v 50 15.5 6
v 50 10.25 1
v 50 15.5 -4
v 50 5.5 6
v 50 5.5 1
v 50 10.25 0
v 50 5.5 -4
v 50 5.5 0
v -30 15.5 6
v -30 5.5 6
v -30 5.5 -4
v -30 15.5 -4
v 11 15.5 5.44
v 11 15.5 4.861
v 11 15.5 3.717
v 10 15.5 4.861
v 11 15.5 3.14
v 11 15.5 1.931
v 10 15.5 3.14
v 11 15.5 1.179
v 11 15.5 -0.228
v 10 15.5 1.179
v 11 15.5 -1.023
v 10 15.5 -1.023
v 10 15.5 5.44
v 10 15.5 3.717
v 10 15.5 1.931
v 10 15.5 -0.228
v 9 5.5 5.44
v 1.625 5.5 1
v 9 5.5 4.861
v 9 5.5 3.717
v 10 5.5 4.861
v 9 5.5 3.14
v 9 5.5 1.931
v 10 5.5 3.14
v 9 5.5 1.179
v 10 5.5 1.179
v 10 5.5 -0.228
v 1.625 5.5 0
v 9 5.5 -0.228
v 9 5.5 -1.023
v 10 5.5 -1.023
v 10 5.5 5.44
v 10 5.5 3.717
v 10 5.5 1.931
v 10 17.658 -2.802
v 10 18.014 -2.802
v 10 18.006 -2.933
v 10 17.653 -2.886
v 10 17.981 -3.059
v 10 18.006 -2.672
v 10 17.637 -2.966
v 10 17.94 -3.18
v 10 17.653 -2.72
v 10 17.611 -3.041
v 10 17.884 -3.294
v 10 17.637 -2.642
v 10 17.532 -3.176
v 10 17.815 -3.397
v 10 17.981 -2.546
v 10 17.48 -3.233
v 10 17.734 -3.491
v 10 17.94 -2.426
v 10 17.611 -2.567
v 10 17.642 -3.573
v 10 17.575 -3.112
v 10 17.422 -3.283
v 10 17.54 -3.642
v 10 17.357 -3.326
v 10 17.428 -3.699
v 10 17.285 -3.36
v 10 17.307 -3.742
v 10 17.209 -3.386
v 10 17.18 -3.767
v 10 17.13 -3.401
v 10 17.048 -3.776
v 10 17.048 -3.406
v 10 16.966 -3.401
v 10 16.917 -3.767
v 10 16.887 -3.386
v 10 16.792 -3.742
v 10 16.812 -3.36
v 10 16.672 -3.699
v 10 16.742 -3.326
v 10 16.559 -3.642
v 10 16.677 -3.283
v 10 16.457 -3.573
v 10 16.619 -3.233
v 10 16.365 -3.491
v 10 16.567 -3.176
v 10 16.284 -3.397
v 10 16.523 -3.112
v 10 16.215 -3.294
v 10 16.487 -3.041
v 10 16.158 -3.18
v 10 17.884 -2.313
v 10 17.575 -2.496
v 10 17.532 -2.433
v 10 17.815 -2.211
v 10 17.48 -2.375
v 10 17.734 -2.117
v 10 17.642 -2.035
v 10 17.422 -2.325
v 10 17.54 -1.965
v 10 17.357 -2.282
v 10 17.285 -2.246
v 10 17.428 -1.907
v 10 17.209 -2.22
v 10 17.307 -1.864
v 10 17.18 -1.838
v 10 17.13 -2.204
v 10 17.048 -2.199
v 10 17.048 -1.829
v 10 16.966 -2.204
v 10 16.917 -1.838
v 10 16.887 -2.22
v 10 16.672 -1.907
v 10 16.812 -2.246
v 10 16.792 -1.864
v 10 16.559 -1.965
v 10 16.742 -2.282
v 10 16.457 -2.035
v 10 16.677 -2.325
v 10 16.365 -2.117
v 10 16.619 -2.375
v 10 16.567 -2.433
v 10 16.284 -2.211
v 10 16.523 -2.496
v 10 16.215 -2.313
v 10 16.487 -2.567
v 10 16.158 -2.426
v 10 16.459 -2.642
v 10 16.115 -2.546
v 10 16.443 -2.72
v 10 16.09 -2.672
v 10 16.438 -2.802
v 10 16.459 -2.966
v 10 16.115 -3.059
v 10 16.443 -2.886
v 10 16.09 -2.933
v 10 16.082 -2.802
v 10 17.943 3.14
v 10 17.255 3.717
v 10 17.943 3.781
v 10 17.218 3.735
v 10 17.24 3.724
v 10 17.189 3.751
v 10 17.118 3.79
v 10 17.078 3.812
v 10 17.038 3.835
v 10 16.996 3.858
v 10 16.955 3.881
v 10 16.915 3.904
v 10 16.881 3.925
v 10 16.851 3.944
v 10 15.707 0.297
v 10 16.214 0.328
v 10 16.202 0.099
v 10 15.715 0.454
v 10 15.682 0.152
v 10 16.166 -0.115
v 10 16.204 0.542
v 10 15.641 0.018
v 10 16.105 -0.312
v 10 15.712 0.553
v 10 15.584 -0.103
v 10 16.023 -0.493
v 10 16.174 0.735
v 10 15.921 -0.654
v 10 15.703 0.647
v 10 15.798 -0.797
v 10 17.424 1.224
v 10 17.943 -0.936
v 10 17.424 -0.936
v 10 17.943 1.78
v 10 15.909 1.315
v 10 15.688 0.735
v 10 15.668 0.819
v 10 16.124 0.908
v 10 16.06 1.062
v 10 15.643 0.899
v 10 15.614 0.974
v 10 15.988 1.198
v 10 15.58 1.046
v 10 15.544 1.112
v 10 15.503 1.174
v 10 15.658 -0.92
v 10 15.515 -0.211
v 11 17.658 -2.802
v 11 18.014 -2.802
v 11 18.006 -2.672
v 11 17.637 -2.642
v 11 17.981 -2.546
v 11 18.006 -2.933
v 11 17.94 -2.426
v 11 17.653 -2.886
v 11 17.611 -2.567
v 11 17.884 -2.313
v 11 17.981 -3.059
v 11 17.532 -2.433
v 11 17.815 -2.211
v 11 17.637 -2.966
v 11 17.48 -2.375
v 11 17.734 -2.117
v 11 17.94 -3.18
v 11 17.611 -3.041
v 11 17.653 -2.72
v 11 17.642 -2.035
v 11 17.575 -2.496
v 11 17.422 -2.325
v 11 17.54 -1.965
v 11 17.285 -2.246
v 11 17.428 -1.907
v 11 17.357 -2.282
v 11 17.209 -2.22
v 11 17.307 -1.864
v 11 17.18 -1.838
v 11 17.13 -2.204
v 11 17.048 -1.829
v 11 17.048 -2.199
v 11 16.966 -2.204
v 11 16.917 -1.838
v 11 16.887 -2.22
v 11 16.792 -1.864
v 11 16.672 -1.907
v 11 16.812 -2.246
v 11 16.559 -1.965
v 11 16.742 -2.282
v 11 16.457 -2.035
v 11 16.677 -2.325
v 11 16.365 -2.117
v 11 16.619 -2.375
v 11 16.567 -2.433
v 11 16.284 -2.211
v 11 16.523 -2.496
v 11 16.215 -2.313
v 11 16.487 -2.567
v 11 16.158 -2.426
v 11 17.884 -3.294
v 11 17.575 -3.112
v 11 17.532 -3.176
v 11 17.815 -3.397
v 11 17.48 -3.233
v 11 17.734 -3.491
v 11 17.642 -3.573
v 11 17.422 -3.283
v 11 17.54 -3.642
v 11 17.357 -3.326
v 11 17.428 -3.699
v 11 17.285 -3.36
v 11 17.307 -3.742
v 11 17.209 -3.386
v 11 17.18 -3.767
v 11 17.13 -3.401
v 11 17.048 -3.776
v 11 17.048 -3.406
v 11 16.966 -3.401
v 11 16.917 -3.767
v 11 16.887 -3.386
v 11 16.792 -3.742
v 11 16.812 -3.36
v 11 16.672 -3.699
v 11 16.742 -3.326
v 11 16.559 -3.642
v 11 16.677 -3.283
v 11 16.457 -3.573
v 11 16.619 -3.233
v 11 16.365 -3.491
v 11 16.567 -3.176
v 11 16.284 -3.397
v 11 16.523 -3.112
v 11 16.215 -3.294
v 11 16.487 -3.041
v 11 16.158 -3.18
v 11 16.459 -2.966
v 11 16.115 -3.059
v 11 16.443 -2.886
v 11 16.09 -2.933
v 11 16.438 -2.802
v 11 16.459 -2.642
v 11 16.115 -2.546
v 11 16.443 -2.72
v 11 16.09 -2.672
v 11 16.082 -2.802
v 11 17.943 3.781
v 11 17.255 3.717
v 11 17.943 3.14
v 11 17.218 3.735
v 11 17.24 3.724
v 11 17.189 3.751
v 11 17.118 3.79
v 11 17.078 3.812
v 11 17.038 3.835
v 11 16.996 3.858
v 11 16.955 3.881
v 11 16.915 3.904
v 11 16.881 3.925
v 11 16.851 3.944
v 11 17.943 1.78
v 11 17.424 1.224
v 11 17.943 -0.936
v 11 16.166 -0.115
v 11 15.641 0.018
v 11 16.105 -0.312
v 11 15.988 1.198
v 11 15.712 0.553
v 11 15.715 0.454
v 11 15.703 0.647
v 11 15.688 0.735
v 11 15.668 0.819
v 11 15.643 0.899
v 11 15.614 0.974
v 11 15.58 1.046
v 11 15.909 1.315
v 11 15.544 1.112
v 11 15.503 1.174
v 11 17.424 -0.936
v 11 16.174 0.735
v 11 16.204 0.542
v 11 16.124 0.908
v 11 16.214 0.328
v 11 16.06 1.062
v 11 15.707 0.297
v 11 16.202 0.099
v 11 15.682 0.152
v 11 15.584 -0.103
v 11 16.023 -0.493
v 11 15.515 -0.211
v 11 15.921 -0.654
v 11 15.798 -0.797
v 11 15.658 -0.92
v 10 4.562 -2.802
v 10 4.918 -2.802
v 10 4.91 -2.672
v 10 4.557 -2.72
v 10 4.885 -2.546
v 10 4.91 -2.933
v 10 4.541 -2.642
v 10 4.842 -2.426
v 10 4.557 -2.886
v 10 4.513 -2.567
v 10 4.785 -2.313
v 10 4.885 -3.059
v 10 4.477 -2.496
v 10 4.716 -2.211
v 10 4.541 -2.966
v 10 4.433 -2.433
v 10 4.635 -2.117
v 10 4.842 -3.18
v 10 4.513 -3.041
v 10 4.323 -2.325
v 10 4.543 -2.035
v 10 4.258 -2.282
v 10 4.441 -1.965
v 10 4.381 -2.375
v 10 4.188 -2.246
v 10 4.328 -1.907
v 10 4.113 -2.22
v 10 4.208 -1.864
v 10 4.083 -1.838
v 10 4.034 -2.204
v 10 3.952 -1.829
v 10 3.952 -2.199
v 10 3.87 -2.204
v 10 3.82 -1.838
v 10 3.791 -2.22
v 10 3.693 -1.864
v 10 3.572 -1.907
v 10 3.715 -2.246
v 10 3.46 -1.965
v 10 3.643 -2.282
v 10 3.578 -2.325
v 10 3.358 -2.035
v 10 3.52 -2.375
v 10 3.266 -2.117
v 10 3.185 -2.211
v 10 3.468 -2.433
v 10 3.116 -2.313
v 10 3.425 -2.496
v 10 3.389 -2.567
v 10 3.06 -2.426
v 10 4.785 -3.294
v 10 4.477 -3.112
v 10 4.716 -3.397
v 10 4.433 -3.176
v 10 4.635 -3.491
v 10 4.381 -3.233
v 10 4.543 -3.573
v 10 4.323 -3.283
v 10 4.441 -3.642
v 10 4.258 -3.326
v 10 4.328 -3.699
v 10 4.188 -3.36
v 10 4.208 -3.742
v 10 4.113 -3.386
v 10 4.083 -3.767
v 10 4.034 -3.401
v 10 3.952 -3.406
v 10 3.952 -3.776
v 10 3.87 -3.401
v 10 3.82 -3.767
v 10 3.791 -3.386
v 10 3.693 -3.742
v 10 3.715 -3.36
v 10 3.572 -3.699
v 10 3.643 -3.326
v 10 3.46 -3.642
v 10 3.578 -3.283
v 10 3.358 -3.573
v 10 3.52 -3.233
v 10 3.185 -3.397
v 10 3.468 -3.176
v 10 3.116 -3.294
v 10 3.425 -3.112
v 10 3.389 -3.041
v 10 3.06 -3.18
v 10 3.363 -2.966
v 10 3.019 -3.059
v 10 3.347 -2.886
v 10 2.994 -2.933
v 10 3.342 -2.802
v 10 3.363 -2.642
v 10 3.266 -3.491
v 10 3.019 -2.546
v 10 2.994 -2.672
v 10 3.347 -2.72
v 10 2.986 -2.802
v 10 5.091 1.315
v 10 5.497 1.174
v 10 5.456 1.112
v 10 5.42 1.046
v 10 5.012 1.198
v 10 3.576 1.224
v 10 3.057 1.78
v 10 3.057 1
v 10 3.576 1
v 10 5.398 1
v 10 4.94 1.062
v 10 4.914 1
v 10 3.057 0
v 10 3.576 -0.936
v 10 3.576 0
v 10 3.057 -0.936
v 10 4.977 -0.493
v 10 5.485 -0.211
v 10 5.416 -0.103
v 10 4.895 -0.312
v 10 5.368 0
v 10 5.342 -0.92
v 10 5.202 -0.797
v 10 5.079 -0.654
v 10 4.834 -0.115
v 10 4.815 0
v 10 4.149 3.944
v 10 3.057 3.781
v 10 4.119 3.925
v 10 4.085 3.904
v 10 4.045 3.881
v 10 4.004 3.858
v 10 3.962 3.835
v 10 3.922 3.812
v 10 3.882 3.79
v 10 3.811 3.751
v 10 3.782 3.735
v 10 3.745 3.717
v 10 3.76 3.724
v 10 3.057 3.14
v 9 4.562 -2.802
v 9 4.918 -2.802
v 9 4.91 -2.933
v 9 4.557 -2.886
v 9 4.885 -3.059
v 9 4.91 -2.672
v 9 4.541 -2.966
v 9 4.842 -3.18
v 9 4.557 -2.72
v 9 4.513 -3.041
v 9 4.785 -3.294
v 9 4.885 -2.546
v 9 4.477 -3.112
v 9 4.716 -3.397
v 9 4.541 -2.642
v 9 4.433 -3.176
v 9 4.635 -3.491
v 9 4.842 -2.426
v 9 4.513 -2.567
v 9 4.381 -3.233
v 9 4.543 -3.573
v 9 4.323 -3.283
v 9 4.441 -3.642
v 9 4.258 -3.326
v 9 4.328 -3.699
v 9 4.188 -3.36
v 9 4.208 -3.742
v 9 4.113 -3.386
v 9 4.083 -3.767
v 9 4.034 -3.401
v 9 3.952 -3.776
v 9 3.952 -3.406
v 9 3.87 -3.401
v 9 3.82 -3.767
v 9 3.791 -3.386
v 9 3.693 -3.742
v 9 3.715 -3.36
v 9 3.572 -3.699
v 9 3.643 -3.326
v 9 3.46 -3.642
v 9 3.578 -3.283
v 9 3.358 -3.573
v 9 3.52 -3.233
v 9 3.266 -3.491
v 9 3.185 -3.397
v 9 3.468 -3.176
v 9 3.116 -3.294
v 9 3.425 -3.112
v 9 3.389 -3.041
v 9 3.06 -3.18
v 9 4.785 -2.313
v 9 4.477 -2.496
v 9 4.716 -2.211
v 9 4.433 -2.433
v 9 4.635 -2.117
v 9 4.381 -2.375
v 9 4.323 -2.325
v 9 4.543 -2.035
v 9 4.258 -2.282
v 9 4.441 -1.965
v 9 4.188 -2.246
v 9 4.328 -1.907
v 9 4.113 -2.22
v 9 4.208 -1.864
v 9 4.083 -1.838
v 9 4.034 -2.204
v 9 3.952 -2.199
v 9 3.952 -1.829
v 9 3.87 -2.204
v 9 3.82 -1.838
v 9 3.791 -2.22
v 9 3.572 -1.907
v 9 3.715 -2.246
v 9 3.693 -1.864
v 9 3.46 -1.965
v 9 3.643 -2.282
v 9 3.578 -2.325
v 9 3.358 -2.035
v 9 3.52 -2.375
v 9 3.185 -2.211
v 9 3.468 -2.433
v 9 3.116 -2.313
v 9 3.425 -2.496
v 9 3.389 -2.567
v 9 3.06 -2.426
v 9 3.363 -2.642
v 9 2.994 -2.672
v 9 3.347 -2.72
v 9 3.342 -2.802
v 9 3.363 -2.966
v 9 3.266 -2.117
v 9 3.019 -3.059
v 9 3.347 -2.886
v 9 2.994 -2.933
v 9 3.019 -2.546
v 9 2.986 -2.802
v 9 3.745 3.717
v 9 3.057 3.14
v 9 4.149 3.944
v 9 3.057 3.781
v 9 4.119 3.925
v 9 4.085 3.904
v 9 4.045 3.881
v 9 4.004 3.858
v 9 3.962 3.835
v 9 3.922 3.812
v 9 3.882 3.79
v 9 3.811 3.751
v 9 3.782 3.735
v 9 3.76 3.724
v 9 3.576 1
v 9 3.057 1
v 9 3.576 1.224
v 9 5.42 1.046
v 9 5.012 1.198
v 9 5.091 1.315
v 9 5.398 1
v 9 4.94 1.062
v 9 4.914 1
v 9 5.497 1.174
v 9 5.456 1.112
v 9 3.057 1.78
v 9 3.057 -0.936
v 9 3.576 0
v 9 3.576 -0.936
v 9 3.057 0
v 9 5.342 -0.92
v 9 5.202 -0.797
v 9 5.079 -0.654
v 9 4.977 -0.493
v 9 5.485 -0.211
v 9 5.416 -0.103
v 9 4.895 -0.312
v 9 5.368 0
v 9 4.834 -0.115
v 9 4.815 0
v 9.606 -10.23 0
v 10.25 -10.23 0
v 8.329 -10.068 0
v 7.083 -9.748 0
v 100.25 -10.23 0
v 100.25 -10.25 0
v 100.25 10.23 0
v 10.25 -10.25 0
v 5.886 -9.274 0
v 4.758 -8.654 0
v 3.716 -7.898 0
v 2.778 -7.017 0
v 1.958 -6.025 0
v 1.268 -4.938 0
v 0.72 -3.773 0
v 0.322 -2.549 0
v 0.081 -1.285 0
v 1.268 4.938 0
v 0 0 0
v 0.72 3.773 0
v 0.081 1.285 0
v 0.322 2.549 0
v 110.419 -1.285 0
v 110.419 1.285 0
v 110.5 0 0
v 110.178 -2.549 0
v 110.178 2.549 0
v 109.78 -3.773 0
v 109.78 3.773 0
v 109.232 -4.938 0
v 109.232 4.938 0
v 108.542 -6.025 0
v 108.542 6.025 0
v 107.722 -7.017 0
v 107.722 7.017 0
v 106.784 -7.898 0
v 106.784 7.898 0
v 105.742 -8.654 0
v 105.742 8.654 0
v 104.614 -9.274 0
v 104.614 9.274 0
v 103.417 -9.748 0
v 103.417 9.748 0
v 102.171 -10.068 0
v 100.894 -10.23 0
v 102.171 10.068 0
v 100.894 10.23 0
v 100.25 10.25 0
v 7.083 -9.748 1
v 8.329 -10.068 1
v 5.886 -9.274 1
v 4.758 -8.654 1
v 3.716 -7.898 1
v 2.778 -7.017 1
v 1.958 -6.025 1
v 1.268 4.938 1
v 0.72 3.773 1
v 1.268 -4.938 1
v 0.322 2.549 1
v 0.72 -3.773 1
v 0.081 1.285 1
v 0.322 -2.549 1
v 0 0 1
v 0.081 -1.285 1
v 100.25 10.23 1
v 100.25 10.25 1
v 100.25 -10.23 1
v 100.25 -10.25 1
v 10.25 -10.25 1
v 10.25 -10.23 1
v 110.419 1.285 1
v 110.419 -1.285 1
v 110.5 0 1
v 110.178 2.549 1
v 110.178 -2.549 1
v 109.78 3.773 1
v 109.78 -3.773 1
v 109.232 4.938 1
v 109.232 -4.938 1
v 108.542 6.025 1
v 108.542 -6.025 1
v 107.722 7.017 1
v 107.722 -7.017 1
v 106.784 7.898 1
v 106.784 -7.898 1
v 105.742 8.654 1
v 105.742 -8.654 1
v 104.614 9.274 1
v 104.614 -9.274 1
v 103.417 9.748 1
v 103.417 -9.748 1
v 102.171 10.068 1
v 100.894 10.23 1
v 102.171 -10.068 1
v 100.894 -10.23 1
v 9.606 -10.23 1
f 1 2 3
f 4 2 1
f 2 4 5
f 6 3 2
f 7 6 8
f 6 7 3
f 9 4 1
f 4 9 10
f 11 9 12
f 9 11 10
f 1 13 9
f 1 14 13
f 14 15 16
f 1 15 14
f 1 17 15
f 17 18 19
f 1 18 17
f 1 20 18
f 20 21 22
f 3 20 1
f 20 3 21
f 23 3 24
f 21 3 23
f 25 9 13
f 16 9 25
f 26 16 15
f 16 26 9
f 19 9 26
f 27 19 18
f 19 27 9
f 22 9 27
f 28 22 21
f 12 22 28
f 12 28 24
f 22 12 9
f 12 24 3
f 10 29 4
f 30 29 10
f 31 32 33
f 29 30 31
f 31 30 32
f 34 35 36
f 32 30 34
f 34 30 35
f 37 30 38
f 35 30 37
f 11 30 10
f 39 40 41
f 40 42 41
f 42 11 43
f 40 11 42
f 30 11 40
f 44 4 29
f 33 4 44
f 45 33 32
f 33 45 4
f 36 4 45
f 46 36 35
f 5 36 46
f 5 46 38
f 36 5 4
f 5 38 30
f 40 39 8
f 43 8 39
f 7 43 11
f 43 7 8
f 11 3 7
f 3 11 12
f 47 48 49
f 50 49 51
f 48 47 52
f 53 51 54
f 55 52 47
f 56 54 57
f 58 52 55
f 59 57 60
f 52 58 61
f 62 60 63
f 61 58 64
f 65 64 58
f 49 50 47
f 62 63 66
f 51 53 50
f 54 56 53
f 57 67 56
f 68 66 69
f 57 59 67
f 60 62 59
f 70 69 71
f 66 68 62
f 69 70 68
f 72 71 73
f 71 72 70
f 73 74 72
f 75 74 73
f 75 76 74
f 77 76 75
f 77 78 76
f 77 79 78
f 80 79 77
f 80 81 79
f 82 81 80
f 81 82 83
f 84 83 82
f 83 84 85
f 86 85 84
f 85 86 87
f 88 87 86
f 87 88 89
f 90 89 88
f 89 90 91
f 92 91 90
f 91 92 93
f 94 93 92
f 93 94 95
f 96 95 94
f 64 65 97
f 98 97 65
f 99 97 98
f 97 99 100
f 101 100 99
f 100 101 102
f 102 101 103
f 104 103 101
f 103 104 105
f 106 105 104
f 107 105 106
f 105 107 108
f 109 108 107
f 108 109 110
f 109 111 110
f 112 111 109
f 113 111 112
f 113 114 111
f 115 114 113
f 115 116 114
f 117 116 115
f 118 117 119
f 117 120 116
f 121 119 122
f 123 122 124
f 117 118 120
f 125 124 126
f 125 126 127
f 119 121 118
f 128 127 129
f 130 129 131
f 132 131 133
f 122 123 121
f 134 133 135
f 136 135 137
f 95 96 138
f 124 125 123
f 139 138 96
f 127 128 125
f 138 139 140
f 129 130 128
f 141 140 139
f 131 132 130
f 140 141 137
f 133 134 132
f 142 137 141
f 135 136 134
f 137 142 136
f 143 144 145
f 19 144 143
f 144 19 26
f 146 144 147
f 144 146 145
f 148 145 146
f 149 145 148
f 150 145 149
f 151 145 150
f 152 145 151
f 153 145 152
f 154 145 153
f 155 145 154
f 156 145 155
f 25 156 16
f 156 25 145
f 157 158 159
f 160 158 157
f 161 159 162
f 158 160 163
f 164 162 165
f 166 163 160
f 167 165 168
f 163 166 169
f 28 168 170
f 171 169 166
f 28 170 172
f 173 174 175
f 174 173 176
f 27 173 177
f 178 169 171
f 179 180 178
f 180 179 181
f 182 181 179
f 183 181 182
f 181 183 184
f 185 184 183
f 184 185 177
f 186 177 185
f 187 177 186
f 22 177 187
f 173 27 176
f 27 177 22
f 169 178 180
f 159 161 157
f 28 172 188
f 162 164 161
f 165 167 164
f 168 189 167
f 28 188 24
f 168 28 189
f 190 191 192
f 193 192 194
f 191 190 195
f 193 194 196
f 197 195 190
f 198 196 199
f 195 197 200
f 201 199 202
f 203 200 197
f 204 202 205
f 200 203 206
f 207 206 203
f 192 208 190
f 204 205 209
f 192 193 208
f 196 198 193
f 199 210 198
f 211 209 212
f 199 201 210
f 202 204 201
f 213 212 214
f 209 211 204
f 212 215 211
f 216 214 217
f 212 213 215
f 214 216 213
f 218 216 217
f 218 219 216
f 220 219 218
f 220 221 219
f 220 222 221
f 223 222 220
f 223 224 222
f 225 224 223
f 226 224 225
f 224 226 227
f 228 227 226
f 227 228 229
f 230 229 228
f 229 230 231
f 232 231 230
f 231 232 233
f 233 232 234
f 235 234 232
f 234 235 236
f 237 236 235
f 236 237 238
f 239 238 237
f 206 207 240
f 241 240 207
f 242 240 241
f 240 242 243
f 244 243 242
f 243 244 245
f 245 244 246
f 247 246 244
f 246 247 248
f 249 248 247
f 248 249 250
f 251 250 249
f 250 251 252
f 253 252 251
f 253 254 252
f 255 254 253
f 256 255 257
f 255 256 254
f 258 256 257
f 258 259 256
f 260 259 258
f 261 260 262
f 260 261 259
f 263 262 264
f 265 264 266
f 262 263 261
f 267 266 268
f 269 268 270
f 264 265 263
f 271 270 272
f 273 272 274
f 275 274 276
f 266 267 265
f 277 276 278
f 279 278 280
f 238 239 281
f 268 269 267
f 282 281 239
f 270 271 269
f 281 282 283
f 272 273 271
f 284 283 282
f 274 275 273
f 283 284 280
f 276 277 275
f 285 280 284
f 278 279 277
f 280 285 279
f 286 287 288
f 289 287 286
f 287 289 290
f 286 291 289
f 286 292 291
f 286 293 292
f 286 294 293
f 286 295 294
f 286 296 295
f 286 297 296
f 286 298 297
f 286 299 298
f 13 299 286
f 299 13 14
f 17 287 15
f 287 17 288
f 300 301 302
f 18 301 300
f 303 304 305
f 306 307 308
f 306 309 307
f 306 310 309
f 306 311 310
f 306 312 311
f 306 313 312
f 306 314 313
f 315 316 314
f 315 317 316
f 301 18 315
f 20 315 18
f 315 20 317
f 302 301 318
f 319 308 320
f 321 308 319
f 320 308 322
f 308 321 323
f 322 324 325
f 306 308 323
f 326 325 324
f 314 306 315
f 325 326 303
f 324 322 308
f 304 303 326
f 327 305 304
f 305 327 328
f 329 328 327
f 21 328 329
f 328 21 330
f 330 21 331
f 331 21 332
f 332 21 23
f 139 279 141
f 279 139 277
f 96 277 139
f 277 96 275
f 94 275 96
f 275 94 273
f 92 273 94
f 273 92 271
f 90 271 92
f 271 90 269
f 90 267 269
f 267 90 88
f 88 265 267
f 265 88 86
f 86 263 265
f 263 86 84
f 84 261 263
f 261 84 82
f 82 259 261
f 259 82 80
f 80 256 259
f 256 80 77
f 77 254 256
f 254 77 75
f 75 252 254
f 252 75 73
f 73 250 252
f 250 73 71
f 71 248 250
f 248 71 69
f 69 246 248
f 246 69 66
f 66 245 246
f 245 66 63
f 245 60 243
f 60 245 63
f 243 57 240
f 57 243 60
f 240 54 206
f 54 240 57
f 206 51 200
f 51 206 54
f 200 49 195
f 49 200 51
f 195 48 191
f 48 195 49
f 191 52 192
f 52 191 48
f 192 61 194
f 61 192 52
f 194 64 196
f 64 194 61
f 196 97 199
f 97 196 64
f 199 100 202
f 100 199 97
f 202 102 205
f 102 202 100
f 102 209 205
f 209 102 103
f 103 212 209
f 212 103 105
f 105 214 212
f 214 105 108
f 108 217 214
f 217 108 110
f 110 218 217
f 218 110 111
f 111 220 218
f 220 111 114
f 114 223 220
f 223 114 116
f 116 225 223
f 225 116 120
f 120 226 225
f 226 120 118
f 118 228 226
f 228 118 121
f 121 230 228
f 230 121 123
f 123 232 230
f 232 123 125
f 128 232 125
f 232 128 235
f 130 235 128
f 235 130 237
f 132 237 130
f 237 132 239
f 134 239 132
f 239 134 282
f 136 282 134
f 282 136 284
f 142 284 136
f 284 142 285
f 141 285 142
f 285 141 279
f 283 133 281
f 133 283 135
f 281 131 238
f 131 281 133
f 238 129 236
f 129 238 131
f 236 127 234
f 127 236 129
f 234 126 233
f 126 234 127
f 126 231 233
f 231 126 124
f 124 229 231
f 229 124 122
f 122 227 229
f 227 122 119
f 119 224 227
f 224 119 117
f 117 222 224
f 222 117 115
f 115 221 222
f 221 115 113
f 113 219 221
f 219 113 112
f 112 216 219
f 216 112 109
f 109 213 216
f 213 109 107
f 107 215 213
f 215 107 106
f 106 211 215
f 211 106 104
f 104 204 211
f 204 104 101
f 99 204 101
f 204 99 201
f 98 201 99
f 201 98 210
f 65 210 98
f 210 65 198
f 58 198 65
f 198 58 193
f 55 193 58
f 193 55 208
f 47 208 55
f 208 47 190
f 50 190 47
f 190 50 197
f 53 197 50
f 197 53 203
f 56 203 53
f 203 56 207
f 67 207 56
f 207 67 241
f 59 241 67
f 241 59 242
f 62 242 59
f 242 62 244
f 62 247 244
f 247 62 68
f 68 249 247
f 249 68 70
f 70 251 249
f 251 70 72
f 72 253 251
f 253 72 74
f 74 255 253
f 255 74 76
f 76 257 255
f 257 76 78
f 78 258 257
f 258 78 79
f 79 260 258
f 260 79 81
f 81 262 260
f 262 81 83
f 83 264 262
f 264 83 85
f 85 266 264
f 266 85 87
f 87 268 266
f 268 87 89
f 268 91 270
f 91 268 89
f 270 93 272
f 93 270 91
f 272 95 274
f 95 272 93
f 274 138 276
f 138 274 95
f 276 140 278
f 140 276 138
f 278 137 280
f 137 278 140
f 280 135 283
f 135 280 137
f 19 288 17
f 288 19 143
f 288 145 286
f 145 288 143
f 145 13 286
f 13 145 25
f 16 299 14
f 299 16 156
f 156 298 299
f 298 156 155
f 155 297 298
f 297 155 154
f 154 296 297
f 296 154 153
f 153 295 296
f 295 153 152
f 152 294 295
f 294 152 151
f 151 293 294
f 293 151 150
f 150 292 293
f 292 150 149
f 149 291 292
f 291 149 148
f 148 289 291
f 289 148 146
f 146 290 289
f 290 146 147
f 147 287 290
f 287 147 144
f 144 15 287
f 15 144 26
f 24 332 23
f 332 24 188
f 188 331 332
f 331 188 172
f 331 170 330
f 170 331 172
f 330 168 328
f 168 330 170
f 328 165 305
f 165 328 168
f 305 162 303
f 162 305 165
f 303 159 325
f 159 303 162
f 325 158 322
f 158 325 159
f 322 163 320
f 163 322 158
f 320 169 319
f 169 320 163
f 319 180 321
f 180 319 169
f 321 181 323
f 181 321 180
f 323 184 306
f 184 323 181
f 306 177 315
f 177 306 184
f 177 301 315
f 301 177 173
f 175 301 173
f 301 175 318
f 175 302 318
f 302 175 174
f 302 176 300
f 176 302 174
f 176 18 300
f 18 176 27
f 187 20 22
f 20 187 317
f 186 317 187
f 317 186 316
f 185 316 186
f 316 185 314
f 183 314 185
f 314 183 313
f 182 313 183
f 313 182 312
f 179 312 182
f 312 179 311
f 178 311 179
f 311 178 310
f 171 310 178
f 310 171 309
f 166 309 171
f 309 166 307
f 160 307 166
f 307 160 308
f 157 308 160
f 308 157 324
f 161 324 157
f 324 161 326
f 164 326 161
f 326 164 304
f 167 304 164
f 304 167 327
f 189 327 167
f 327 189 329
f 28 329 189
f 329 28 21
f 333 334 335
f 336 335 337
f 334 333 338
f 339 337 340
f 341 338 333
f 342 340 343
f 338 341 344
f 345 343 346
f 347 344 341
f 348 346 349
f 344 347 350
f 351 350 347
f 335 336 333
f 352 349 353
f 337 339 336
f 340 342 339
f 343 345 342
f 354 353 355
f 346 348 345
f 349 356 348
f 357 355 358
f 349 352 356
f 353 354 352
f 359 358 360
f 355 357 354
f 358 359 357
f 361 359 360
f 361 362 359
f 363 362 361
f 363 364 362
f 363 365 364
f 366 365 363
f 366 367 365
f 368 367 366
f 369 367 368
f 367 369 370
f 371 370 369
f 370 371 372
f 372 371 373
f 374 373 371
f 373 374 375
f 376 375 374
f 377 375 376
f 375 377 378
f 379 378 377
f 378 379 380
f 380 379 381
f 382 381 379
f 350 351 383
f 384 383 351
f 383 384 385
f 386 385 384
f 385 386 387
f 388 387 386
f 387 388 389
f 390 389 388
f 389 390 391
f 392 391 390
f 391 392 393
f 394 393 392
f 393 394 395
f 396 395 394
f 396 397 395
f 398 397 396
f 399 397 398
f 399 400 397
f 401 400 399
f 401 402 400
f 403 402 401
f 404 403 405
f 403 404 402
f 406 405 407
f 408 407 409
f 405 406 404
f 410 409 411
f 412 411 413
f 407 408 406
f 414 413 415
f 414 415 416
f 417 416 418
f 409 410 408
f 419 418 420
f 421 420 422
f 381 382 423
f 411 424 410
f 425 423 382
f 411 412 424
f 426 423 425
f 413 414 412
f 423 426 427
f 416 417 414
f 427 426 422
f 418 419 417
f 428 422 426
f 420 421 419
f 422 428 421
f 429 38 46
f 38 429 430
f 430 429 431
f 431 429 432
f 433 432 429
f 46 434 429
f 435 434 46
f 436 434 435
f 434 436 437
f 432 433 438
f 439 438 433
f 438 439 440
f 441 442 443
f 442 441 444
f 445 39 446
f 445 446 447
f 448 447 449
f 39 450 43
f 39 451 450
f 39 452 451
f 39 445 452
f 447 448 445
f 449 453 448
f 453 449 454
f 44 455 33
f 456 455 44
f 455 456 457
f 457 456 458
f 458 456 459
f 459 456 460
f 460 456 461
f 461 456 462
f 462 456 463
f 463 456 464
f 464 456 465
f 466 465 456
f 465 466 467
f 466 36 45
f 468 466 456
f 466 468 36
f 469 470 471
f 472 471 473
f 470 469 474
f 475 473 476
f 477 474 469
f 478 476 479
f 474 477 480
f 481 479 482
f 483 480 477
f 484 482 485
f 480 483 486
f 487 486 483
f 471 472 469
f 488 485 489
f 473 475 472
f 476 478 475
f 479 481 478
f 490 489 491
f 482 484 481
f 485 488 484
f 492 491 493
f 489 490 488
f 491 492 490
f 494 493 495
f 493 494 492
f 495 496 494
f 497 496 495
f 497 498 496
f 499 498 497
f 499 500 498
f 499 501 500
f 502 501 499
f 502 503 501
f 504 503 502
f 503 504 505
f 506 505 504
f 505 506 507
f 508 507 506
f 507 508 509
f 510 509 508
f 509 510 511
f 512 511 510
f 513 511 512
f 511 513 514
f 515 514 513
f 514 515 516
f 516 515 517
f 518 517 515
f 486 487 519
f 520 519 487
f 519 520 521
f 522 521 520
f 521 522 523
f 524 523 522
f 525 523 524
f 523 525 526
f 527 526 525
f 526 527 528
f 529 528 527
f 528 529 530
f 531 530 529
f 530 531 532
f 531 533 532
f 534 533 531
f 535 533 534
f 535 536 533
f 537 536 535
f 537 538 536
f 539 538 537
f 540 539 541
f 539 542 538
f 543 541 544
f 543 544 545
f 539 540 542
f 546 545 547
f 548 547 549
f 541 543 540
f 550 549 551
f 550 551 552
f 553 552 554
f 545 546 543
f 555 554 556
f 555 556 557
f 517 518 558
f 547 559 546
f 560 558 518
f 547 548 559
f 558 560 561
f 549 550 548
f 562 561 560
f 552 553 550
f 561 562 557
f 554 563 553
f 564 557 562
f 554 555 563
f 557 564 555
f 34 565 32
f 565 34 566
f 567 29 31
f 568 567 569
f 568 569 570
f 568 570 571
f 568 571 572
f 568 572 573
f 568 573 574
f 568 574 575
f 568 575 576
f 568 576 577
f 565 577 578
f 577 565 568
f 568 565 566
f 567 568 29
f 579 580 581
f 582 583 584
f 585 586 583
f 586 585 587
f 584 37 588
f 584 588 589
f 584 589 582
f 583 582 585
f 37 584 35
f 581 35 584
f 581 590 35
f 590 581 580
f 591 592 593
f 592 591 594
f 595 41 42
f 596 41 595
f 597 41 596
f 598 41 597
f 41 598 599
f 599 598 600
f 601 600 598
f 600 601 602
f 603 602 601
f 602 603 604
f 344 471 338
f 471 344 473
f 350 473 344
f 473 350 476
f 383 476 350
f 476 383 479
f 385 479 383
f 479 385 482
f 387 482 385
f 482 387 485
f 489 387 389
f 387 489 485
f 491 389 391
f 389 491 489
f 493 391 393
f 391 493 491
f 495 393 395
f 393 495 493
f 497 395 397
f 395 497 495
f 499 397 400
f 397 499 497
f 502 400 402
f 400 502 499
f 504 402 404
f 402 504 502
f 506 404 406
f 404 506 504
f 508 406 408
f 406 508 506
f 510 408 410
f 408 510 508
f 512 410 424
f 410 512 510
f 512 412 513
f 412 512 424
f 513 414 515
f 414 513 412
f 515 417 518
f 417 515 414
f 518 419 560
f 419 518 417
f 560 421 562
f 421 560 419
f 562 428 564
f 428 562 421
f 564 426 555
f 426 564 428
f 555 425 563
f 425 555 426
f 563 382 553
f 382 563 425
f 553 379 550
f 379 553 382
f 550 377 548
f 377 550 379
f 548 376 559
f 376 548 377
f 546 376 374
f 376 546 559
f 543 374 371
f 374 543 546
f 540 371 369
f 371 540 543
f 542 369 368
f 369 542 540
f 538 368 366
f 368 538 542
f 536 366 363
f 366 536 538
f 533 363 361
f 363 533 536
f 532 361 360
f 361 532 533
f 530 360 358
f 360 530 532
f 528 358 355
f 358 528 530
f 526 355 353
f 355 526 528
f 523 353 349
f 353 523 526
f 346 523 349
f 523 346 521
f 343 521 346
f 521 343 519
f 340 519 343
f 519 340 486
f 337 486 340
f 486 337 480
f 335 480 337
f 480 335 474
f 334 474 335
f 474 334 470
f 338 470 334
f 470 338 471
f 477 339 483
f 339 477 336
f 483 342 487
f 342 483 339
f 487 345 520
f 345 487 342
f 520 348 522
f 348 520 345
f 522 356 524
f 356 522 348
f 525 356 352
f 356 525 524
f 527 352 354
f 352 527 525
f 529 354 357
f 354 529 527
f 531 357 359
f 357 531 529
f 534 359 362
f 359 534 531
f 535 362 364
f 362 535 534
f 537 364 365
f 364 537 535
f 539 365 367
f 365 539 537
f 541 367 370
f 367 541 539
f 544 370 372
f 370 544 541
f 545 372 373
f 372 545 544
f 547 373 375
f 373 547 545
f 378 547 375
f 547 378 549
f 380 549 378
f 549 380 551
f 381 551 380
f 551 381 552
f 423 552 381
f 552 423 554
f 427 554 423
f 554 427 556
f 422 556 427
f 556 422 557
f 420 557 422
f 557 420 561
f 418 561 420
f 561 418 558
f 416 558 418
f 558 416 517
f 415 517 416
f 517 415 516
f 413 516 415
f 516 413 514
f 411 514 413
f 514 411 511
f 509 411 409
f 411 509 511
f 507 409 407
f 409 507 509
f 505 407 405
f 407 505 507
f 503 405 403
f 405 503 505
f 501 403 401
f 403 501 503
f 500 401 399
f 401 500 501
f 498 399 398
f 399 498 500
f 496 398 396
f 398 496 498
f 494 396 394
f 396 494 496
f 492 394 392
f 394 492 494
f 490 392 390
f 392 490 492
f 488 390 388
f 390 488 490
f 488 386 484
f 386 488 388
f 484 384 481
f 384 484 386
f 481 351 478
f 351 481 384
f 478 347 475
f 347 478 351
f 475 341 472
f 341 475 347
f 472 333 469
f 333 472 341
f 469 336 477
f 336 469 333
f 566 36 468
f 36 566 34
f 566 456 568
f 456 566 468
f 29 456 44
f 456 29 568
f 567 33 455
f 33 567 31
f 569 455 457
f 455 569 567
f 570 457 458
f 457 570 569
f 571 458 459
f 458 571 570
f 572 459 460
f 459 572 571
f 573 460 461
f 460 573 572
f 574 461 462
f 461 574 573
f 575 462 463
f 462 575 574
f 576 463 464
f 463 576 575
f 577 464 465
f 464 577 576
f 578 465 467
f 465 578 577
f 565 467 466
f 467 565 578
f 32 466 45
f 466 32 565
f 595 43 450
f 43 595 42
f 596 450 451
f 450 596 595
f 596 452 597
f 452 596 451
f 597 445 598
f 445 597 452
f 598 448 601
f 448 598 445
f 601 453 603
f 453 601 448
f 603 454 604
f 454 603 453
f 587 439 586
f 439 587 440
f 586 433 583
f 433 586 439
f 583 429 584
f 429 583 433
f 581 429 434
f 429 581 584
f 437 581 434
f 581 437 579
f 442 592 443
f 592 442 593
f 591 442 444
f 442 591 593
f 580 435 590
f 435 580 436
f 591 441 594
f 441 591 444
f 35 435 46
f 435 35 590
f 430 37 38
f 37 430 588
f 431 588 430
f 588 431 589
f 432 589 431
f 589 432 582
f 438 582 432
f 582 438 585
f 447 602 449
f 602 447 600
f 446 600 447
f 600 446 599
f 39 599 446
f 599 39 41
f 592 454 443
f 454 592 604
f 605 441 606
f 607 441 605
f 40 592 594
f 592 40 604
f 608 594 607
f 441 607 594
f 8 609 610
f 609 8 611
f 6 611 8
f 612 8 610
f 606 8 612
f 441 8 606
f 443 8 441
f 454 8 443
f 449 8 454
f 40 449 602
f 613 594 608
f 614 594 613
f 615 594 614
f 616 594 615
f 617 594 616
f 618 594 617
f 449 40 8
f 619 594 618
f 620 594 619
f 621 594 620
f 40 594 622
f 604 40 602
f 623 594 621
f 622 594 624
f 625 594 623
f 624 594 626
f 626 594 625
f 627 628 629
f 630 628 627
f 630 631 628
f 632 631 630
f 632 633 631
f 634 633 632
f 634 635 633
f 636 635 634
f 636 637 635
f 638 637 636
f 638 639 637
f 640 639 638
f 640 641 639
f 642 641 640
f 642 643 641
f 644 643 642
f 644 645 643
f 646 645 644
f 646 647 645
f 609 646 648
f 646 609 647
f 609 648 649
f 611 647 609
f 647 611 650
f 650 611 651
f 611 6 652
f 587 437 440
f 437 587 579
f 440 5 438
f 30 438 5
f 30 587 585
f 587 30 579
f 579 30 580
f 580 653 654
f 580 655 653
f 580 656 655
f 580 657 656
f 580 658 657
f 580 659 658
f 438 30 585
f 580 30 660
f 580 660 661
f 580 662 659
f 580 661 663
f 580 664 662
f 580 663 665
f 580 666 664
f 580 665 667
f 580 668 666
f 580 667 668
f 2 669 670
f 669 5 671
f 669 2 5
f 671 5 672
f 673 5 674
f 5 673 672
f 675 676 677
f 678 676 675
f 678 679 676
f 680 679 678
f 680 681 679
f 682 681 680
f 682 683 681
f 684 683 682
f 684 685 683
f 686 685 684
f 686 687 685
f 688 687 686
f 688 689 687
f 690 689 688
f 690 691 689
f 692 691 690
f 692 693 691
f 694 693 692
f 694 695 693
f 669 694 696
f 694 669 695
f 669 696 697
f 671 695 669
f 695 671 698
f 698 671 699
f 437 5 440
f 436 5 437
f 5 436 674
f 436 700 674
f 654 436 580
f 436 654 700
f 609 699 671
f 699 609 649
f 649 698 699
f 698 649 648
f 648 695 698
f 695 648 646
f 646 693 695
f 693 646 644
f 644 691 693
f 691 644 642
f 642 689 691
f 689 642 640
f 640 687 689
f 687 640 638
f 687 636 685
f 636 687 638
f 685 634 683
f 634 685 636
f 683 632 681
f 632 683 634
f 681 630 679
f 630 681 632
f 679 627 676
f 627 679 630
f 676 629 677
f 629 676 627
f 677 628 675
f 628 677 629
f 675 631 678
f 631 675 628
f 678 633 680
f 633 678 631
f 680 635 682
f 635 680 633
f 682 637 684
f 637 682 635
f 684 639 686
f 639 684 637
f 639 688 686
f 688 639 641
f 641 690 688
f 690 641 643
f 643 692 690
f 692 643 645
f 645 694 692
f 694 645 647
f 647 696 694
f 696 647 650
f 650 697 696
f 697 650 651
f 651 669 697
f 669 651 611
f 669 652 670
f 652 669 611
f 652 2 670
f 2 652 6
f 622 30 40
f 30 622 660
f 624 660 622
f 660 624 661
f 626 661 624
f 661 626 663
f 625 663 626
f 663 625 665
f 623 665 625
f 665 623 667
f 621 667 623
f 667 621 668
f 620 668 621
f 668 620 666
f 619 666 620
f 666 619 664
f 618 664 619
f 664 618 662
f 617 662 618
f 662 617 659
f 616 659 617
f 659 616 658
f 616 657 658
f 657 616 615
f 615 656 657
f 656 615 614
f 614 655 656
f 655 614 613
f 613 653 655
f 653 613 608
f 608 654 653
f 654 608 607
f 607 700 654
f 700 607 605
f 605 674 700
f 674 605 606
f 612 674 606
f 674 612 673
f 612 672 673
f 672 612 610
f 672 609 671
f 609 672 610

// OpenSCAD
// file: modules.scad
/*
 This file provides simple modules for dealing with complex shapes
 */


module rounded_rectangle(
  w = 5,
  l = 20,
  h = 5,
  res = 50,
) {
  translate([w/2, 0, h/2])
  linear_extrude(height=h, center=true) {
    union() {
      translate([0, 0, 0])
      circle(d=w, $fn=res);
      translate([l/2, 0, 0])
      square([l, w], center=true);
      translate([l, 0, 0])
      circle(d=w, $fn=res);
    }
  }
}

// Define the 45° text
module text45(
  h = 1,
  s = 5,
) {
  linear_extrude(height = h) text("45°", size = s, halign = "center", valign = "center");
}

module block45(
  w = 15.5,
  d = 10,
  h = 10,
) {
  cube([w, d, h], center=true);
  // create a larger, rotated cube to subtract
  // this will create the 45 degree angle at the bottom
  difference() {
    cube([w, d, h], center=true);
    translate([0, 0, -h]) 
    rotate([45, 0, 0]) {
      cube([w * 3/2, d * 3/2, h * 3/2], center=true);
    }
  }
  // Define the 45° text
  // add the symbol to the front face
  translate([0, d / 2, 0])
  rotate([0, 90, 0]) 
  text45();
  // add to the back face, rotated 180 degrees
  translate([0, - d / 2, 0])
  rotate([0, 90, 180]) 
  text45();
}
// main file
/*
 This is adapted from many and is configurable.
 If your Gcode goes by mm, each layer is 10, base is 1.5, so adjust from there
 */
include <modules.scad>

// base params
total_width = 90;
base_height = 1;
total_depth = 20.5;
// layer params
layer_height = 10;
layer_width = 80;
layer_depth = 10;
// temp params
temp = 185;
inc = 5;
steps = 8;

module base(
  w = total_width,
  d = total_depth,
  h = base_height
) {
  rounded_rectangle(
    l=total_width,
    w=total_depth,
    h=base_height);
}

module layer(
  t = temp,
  w = layer_width,
  d = layer_depth,
  h = layer_height,
) {
  block45(w=w,d=d,h=h);
}

base();
translate(
  [total_width - layer_width,
   total_depth - layer_depth,
   base_height])
layer();
